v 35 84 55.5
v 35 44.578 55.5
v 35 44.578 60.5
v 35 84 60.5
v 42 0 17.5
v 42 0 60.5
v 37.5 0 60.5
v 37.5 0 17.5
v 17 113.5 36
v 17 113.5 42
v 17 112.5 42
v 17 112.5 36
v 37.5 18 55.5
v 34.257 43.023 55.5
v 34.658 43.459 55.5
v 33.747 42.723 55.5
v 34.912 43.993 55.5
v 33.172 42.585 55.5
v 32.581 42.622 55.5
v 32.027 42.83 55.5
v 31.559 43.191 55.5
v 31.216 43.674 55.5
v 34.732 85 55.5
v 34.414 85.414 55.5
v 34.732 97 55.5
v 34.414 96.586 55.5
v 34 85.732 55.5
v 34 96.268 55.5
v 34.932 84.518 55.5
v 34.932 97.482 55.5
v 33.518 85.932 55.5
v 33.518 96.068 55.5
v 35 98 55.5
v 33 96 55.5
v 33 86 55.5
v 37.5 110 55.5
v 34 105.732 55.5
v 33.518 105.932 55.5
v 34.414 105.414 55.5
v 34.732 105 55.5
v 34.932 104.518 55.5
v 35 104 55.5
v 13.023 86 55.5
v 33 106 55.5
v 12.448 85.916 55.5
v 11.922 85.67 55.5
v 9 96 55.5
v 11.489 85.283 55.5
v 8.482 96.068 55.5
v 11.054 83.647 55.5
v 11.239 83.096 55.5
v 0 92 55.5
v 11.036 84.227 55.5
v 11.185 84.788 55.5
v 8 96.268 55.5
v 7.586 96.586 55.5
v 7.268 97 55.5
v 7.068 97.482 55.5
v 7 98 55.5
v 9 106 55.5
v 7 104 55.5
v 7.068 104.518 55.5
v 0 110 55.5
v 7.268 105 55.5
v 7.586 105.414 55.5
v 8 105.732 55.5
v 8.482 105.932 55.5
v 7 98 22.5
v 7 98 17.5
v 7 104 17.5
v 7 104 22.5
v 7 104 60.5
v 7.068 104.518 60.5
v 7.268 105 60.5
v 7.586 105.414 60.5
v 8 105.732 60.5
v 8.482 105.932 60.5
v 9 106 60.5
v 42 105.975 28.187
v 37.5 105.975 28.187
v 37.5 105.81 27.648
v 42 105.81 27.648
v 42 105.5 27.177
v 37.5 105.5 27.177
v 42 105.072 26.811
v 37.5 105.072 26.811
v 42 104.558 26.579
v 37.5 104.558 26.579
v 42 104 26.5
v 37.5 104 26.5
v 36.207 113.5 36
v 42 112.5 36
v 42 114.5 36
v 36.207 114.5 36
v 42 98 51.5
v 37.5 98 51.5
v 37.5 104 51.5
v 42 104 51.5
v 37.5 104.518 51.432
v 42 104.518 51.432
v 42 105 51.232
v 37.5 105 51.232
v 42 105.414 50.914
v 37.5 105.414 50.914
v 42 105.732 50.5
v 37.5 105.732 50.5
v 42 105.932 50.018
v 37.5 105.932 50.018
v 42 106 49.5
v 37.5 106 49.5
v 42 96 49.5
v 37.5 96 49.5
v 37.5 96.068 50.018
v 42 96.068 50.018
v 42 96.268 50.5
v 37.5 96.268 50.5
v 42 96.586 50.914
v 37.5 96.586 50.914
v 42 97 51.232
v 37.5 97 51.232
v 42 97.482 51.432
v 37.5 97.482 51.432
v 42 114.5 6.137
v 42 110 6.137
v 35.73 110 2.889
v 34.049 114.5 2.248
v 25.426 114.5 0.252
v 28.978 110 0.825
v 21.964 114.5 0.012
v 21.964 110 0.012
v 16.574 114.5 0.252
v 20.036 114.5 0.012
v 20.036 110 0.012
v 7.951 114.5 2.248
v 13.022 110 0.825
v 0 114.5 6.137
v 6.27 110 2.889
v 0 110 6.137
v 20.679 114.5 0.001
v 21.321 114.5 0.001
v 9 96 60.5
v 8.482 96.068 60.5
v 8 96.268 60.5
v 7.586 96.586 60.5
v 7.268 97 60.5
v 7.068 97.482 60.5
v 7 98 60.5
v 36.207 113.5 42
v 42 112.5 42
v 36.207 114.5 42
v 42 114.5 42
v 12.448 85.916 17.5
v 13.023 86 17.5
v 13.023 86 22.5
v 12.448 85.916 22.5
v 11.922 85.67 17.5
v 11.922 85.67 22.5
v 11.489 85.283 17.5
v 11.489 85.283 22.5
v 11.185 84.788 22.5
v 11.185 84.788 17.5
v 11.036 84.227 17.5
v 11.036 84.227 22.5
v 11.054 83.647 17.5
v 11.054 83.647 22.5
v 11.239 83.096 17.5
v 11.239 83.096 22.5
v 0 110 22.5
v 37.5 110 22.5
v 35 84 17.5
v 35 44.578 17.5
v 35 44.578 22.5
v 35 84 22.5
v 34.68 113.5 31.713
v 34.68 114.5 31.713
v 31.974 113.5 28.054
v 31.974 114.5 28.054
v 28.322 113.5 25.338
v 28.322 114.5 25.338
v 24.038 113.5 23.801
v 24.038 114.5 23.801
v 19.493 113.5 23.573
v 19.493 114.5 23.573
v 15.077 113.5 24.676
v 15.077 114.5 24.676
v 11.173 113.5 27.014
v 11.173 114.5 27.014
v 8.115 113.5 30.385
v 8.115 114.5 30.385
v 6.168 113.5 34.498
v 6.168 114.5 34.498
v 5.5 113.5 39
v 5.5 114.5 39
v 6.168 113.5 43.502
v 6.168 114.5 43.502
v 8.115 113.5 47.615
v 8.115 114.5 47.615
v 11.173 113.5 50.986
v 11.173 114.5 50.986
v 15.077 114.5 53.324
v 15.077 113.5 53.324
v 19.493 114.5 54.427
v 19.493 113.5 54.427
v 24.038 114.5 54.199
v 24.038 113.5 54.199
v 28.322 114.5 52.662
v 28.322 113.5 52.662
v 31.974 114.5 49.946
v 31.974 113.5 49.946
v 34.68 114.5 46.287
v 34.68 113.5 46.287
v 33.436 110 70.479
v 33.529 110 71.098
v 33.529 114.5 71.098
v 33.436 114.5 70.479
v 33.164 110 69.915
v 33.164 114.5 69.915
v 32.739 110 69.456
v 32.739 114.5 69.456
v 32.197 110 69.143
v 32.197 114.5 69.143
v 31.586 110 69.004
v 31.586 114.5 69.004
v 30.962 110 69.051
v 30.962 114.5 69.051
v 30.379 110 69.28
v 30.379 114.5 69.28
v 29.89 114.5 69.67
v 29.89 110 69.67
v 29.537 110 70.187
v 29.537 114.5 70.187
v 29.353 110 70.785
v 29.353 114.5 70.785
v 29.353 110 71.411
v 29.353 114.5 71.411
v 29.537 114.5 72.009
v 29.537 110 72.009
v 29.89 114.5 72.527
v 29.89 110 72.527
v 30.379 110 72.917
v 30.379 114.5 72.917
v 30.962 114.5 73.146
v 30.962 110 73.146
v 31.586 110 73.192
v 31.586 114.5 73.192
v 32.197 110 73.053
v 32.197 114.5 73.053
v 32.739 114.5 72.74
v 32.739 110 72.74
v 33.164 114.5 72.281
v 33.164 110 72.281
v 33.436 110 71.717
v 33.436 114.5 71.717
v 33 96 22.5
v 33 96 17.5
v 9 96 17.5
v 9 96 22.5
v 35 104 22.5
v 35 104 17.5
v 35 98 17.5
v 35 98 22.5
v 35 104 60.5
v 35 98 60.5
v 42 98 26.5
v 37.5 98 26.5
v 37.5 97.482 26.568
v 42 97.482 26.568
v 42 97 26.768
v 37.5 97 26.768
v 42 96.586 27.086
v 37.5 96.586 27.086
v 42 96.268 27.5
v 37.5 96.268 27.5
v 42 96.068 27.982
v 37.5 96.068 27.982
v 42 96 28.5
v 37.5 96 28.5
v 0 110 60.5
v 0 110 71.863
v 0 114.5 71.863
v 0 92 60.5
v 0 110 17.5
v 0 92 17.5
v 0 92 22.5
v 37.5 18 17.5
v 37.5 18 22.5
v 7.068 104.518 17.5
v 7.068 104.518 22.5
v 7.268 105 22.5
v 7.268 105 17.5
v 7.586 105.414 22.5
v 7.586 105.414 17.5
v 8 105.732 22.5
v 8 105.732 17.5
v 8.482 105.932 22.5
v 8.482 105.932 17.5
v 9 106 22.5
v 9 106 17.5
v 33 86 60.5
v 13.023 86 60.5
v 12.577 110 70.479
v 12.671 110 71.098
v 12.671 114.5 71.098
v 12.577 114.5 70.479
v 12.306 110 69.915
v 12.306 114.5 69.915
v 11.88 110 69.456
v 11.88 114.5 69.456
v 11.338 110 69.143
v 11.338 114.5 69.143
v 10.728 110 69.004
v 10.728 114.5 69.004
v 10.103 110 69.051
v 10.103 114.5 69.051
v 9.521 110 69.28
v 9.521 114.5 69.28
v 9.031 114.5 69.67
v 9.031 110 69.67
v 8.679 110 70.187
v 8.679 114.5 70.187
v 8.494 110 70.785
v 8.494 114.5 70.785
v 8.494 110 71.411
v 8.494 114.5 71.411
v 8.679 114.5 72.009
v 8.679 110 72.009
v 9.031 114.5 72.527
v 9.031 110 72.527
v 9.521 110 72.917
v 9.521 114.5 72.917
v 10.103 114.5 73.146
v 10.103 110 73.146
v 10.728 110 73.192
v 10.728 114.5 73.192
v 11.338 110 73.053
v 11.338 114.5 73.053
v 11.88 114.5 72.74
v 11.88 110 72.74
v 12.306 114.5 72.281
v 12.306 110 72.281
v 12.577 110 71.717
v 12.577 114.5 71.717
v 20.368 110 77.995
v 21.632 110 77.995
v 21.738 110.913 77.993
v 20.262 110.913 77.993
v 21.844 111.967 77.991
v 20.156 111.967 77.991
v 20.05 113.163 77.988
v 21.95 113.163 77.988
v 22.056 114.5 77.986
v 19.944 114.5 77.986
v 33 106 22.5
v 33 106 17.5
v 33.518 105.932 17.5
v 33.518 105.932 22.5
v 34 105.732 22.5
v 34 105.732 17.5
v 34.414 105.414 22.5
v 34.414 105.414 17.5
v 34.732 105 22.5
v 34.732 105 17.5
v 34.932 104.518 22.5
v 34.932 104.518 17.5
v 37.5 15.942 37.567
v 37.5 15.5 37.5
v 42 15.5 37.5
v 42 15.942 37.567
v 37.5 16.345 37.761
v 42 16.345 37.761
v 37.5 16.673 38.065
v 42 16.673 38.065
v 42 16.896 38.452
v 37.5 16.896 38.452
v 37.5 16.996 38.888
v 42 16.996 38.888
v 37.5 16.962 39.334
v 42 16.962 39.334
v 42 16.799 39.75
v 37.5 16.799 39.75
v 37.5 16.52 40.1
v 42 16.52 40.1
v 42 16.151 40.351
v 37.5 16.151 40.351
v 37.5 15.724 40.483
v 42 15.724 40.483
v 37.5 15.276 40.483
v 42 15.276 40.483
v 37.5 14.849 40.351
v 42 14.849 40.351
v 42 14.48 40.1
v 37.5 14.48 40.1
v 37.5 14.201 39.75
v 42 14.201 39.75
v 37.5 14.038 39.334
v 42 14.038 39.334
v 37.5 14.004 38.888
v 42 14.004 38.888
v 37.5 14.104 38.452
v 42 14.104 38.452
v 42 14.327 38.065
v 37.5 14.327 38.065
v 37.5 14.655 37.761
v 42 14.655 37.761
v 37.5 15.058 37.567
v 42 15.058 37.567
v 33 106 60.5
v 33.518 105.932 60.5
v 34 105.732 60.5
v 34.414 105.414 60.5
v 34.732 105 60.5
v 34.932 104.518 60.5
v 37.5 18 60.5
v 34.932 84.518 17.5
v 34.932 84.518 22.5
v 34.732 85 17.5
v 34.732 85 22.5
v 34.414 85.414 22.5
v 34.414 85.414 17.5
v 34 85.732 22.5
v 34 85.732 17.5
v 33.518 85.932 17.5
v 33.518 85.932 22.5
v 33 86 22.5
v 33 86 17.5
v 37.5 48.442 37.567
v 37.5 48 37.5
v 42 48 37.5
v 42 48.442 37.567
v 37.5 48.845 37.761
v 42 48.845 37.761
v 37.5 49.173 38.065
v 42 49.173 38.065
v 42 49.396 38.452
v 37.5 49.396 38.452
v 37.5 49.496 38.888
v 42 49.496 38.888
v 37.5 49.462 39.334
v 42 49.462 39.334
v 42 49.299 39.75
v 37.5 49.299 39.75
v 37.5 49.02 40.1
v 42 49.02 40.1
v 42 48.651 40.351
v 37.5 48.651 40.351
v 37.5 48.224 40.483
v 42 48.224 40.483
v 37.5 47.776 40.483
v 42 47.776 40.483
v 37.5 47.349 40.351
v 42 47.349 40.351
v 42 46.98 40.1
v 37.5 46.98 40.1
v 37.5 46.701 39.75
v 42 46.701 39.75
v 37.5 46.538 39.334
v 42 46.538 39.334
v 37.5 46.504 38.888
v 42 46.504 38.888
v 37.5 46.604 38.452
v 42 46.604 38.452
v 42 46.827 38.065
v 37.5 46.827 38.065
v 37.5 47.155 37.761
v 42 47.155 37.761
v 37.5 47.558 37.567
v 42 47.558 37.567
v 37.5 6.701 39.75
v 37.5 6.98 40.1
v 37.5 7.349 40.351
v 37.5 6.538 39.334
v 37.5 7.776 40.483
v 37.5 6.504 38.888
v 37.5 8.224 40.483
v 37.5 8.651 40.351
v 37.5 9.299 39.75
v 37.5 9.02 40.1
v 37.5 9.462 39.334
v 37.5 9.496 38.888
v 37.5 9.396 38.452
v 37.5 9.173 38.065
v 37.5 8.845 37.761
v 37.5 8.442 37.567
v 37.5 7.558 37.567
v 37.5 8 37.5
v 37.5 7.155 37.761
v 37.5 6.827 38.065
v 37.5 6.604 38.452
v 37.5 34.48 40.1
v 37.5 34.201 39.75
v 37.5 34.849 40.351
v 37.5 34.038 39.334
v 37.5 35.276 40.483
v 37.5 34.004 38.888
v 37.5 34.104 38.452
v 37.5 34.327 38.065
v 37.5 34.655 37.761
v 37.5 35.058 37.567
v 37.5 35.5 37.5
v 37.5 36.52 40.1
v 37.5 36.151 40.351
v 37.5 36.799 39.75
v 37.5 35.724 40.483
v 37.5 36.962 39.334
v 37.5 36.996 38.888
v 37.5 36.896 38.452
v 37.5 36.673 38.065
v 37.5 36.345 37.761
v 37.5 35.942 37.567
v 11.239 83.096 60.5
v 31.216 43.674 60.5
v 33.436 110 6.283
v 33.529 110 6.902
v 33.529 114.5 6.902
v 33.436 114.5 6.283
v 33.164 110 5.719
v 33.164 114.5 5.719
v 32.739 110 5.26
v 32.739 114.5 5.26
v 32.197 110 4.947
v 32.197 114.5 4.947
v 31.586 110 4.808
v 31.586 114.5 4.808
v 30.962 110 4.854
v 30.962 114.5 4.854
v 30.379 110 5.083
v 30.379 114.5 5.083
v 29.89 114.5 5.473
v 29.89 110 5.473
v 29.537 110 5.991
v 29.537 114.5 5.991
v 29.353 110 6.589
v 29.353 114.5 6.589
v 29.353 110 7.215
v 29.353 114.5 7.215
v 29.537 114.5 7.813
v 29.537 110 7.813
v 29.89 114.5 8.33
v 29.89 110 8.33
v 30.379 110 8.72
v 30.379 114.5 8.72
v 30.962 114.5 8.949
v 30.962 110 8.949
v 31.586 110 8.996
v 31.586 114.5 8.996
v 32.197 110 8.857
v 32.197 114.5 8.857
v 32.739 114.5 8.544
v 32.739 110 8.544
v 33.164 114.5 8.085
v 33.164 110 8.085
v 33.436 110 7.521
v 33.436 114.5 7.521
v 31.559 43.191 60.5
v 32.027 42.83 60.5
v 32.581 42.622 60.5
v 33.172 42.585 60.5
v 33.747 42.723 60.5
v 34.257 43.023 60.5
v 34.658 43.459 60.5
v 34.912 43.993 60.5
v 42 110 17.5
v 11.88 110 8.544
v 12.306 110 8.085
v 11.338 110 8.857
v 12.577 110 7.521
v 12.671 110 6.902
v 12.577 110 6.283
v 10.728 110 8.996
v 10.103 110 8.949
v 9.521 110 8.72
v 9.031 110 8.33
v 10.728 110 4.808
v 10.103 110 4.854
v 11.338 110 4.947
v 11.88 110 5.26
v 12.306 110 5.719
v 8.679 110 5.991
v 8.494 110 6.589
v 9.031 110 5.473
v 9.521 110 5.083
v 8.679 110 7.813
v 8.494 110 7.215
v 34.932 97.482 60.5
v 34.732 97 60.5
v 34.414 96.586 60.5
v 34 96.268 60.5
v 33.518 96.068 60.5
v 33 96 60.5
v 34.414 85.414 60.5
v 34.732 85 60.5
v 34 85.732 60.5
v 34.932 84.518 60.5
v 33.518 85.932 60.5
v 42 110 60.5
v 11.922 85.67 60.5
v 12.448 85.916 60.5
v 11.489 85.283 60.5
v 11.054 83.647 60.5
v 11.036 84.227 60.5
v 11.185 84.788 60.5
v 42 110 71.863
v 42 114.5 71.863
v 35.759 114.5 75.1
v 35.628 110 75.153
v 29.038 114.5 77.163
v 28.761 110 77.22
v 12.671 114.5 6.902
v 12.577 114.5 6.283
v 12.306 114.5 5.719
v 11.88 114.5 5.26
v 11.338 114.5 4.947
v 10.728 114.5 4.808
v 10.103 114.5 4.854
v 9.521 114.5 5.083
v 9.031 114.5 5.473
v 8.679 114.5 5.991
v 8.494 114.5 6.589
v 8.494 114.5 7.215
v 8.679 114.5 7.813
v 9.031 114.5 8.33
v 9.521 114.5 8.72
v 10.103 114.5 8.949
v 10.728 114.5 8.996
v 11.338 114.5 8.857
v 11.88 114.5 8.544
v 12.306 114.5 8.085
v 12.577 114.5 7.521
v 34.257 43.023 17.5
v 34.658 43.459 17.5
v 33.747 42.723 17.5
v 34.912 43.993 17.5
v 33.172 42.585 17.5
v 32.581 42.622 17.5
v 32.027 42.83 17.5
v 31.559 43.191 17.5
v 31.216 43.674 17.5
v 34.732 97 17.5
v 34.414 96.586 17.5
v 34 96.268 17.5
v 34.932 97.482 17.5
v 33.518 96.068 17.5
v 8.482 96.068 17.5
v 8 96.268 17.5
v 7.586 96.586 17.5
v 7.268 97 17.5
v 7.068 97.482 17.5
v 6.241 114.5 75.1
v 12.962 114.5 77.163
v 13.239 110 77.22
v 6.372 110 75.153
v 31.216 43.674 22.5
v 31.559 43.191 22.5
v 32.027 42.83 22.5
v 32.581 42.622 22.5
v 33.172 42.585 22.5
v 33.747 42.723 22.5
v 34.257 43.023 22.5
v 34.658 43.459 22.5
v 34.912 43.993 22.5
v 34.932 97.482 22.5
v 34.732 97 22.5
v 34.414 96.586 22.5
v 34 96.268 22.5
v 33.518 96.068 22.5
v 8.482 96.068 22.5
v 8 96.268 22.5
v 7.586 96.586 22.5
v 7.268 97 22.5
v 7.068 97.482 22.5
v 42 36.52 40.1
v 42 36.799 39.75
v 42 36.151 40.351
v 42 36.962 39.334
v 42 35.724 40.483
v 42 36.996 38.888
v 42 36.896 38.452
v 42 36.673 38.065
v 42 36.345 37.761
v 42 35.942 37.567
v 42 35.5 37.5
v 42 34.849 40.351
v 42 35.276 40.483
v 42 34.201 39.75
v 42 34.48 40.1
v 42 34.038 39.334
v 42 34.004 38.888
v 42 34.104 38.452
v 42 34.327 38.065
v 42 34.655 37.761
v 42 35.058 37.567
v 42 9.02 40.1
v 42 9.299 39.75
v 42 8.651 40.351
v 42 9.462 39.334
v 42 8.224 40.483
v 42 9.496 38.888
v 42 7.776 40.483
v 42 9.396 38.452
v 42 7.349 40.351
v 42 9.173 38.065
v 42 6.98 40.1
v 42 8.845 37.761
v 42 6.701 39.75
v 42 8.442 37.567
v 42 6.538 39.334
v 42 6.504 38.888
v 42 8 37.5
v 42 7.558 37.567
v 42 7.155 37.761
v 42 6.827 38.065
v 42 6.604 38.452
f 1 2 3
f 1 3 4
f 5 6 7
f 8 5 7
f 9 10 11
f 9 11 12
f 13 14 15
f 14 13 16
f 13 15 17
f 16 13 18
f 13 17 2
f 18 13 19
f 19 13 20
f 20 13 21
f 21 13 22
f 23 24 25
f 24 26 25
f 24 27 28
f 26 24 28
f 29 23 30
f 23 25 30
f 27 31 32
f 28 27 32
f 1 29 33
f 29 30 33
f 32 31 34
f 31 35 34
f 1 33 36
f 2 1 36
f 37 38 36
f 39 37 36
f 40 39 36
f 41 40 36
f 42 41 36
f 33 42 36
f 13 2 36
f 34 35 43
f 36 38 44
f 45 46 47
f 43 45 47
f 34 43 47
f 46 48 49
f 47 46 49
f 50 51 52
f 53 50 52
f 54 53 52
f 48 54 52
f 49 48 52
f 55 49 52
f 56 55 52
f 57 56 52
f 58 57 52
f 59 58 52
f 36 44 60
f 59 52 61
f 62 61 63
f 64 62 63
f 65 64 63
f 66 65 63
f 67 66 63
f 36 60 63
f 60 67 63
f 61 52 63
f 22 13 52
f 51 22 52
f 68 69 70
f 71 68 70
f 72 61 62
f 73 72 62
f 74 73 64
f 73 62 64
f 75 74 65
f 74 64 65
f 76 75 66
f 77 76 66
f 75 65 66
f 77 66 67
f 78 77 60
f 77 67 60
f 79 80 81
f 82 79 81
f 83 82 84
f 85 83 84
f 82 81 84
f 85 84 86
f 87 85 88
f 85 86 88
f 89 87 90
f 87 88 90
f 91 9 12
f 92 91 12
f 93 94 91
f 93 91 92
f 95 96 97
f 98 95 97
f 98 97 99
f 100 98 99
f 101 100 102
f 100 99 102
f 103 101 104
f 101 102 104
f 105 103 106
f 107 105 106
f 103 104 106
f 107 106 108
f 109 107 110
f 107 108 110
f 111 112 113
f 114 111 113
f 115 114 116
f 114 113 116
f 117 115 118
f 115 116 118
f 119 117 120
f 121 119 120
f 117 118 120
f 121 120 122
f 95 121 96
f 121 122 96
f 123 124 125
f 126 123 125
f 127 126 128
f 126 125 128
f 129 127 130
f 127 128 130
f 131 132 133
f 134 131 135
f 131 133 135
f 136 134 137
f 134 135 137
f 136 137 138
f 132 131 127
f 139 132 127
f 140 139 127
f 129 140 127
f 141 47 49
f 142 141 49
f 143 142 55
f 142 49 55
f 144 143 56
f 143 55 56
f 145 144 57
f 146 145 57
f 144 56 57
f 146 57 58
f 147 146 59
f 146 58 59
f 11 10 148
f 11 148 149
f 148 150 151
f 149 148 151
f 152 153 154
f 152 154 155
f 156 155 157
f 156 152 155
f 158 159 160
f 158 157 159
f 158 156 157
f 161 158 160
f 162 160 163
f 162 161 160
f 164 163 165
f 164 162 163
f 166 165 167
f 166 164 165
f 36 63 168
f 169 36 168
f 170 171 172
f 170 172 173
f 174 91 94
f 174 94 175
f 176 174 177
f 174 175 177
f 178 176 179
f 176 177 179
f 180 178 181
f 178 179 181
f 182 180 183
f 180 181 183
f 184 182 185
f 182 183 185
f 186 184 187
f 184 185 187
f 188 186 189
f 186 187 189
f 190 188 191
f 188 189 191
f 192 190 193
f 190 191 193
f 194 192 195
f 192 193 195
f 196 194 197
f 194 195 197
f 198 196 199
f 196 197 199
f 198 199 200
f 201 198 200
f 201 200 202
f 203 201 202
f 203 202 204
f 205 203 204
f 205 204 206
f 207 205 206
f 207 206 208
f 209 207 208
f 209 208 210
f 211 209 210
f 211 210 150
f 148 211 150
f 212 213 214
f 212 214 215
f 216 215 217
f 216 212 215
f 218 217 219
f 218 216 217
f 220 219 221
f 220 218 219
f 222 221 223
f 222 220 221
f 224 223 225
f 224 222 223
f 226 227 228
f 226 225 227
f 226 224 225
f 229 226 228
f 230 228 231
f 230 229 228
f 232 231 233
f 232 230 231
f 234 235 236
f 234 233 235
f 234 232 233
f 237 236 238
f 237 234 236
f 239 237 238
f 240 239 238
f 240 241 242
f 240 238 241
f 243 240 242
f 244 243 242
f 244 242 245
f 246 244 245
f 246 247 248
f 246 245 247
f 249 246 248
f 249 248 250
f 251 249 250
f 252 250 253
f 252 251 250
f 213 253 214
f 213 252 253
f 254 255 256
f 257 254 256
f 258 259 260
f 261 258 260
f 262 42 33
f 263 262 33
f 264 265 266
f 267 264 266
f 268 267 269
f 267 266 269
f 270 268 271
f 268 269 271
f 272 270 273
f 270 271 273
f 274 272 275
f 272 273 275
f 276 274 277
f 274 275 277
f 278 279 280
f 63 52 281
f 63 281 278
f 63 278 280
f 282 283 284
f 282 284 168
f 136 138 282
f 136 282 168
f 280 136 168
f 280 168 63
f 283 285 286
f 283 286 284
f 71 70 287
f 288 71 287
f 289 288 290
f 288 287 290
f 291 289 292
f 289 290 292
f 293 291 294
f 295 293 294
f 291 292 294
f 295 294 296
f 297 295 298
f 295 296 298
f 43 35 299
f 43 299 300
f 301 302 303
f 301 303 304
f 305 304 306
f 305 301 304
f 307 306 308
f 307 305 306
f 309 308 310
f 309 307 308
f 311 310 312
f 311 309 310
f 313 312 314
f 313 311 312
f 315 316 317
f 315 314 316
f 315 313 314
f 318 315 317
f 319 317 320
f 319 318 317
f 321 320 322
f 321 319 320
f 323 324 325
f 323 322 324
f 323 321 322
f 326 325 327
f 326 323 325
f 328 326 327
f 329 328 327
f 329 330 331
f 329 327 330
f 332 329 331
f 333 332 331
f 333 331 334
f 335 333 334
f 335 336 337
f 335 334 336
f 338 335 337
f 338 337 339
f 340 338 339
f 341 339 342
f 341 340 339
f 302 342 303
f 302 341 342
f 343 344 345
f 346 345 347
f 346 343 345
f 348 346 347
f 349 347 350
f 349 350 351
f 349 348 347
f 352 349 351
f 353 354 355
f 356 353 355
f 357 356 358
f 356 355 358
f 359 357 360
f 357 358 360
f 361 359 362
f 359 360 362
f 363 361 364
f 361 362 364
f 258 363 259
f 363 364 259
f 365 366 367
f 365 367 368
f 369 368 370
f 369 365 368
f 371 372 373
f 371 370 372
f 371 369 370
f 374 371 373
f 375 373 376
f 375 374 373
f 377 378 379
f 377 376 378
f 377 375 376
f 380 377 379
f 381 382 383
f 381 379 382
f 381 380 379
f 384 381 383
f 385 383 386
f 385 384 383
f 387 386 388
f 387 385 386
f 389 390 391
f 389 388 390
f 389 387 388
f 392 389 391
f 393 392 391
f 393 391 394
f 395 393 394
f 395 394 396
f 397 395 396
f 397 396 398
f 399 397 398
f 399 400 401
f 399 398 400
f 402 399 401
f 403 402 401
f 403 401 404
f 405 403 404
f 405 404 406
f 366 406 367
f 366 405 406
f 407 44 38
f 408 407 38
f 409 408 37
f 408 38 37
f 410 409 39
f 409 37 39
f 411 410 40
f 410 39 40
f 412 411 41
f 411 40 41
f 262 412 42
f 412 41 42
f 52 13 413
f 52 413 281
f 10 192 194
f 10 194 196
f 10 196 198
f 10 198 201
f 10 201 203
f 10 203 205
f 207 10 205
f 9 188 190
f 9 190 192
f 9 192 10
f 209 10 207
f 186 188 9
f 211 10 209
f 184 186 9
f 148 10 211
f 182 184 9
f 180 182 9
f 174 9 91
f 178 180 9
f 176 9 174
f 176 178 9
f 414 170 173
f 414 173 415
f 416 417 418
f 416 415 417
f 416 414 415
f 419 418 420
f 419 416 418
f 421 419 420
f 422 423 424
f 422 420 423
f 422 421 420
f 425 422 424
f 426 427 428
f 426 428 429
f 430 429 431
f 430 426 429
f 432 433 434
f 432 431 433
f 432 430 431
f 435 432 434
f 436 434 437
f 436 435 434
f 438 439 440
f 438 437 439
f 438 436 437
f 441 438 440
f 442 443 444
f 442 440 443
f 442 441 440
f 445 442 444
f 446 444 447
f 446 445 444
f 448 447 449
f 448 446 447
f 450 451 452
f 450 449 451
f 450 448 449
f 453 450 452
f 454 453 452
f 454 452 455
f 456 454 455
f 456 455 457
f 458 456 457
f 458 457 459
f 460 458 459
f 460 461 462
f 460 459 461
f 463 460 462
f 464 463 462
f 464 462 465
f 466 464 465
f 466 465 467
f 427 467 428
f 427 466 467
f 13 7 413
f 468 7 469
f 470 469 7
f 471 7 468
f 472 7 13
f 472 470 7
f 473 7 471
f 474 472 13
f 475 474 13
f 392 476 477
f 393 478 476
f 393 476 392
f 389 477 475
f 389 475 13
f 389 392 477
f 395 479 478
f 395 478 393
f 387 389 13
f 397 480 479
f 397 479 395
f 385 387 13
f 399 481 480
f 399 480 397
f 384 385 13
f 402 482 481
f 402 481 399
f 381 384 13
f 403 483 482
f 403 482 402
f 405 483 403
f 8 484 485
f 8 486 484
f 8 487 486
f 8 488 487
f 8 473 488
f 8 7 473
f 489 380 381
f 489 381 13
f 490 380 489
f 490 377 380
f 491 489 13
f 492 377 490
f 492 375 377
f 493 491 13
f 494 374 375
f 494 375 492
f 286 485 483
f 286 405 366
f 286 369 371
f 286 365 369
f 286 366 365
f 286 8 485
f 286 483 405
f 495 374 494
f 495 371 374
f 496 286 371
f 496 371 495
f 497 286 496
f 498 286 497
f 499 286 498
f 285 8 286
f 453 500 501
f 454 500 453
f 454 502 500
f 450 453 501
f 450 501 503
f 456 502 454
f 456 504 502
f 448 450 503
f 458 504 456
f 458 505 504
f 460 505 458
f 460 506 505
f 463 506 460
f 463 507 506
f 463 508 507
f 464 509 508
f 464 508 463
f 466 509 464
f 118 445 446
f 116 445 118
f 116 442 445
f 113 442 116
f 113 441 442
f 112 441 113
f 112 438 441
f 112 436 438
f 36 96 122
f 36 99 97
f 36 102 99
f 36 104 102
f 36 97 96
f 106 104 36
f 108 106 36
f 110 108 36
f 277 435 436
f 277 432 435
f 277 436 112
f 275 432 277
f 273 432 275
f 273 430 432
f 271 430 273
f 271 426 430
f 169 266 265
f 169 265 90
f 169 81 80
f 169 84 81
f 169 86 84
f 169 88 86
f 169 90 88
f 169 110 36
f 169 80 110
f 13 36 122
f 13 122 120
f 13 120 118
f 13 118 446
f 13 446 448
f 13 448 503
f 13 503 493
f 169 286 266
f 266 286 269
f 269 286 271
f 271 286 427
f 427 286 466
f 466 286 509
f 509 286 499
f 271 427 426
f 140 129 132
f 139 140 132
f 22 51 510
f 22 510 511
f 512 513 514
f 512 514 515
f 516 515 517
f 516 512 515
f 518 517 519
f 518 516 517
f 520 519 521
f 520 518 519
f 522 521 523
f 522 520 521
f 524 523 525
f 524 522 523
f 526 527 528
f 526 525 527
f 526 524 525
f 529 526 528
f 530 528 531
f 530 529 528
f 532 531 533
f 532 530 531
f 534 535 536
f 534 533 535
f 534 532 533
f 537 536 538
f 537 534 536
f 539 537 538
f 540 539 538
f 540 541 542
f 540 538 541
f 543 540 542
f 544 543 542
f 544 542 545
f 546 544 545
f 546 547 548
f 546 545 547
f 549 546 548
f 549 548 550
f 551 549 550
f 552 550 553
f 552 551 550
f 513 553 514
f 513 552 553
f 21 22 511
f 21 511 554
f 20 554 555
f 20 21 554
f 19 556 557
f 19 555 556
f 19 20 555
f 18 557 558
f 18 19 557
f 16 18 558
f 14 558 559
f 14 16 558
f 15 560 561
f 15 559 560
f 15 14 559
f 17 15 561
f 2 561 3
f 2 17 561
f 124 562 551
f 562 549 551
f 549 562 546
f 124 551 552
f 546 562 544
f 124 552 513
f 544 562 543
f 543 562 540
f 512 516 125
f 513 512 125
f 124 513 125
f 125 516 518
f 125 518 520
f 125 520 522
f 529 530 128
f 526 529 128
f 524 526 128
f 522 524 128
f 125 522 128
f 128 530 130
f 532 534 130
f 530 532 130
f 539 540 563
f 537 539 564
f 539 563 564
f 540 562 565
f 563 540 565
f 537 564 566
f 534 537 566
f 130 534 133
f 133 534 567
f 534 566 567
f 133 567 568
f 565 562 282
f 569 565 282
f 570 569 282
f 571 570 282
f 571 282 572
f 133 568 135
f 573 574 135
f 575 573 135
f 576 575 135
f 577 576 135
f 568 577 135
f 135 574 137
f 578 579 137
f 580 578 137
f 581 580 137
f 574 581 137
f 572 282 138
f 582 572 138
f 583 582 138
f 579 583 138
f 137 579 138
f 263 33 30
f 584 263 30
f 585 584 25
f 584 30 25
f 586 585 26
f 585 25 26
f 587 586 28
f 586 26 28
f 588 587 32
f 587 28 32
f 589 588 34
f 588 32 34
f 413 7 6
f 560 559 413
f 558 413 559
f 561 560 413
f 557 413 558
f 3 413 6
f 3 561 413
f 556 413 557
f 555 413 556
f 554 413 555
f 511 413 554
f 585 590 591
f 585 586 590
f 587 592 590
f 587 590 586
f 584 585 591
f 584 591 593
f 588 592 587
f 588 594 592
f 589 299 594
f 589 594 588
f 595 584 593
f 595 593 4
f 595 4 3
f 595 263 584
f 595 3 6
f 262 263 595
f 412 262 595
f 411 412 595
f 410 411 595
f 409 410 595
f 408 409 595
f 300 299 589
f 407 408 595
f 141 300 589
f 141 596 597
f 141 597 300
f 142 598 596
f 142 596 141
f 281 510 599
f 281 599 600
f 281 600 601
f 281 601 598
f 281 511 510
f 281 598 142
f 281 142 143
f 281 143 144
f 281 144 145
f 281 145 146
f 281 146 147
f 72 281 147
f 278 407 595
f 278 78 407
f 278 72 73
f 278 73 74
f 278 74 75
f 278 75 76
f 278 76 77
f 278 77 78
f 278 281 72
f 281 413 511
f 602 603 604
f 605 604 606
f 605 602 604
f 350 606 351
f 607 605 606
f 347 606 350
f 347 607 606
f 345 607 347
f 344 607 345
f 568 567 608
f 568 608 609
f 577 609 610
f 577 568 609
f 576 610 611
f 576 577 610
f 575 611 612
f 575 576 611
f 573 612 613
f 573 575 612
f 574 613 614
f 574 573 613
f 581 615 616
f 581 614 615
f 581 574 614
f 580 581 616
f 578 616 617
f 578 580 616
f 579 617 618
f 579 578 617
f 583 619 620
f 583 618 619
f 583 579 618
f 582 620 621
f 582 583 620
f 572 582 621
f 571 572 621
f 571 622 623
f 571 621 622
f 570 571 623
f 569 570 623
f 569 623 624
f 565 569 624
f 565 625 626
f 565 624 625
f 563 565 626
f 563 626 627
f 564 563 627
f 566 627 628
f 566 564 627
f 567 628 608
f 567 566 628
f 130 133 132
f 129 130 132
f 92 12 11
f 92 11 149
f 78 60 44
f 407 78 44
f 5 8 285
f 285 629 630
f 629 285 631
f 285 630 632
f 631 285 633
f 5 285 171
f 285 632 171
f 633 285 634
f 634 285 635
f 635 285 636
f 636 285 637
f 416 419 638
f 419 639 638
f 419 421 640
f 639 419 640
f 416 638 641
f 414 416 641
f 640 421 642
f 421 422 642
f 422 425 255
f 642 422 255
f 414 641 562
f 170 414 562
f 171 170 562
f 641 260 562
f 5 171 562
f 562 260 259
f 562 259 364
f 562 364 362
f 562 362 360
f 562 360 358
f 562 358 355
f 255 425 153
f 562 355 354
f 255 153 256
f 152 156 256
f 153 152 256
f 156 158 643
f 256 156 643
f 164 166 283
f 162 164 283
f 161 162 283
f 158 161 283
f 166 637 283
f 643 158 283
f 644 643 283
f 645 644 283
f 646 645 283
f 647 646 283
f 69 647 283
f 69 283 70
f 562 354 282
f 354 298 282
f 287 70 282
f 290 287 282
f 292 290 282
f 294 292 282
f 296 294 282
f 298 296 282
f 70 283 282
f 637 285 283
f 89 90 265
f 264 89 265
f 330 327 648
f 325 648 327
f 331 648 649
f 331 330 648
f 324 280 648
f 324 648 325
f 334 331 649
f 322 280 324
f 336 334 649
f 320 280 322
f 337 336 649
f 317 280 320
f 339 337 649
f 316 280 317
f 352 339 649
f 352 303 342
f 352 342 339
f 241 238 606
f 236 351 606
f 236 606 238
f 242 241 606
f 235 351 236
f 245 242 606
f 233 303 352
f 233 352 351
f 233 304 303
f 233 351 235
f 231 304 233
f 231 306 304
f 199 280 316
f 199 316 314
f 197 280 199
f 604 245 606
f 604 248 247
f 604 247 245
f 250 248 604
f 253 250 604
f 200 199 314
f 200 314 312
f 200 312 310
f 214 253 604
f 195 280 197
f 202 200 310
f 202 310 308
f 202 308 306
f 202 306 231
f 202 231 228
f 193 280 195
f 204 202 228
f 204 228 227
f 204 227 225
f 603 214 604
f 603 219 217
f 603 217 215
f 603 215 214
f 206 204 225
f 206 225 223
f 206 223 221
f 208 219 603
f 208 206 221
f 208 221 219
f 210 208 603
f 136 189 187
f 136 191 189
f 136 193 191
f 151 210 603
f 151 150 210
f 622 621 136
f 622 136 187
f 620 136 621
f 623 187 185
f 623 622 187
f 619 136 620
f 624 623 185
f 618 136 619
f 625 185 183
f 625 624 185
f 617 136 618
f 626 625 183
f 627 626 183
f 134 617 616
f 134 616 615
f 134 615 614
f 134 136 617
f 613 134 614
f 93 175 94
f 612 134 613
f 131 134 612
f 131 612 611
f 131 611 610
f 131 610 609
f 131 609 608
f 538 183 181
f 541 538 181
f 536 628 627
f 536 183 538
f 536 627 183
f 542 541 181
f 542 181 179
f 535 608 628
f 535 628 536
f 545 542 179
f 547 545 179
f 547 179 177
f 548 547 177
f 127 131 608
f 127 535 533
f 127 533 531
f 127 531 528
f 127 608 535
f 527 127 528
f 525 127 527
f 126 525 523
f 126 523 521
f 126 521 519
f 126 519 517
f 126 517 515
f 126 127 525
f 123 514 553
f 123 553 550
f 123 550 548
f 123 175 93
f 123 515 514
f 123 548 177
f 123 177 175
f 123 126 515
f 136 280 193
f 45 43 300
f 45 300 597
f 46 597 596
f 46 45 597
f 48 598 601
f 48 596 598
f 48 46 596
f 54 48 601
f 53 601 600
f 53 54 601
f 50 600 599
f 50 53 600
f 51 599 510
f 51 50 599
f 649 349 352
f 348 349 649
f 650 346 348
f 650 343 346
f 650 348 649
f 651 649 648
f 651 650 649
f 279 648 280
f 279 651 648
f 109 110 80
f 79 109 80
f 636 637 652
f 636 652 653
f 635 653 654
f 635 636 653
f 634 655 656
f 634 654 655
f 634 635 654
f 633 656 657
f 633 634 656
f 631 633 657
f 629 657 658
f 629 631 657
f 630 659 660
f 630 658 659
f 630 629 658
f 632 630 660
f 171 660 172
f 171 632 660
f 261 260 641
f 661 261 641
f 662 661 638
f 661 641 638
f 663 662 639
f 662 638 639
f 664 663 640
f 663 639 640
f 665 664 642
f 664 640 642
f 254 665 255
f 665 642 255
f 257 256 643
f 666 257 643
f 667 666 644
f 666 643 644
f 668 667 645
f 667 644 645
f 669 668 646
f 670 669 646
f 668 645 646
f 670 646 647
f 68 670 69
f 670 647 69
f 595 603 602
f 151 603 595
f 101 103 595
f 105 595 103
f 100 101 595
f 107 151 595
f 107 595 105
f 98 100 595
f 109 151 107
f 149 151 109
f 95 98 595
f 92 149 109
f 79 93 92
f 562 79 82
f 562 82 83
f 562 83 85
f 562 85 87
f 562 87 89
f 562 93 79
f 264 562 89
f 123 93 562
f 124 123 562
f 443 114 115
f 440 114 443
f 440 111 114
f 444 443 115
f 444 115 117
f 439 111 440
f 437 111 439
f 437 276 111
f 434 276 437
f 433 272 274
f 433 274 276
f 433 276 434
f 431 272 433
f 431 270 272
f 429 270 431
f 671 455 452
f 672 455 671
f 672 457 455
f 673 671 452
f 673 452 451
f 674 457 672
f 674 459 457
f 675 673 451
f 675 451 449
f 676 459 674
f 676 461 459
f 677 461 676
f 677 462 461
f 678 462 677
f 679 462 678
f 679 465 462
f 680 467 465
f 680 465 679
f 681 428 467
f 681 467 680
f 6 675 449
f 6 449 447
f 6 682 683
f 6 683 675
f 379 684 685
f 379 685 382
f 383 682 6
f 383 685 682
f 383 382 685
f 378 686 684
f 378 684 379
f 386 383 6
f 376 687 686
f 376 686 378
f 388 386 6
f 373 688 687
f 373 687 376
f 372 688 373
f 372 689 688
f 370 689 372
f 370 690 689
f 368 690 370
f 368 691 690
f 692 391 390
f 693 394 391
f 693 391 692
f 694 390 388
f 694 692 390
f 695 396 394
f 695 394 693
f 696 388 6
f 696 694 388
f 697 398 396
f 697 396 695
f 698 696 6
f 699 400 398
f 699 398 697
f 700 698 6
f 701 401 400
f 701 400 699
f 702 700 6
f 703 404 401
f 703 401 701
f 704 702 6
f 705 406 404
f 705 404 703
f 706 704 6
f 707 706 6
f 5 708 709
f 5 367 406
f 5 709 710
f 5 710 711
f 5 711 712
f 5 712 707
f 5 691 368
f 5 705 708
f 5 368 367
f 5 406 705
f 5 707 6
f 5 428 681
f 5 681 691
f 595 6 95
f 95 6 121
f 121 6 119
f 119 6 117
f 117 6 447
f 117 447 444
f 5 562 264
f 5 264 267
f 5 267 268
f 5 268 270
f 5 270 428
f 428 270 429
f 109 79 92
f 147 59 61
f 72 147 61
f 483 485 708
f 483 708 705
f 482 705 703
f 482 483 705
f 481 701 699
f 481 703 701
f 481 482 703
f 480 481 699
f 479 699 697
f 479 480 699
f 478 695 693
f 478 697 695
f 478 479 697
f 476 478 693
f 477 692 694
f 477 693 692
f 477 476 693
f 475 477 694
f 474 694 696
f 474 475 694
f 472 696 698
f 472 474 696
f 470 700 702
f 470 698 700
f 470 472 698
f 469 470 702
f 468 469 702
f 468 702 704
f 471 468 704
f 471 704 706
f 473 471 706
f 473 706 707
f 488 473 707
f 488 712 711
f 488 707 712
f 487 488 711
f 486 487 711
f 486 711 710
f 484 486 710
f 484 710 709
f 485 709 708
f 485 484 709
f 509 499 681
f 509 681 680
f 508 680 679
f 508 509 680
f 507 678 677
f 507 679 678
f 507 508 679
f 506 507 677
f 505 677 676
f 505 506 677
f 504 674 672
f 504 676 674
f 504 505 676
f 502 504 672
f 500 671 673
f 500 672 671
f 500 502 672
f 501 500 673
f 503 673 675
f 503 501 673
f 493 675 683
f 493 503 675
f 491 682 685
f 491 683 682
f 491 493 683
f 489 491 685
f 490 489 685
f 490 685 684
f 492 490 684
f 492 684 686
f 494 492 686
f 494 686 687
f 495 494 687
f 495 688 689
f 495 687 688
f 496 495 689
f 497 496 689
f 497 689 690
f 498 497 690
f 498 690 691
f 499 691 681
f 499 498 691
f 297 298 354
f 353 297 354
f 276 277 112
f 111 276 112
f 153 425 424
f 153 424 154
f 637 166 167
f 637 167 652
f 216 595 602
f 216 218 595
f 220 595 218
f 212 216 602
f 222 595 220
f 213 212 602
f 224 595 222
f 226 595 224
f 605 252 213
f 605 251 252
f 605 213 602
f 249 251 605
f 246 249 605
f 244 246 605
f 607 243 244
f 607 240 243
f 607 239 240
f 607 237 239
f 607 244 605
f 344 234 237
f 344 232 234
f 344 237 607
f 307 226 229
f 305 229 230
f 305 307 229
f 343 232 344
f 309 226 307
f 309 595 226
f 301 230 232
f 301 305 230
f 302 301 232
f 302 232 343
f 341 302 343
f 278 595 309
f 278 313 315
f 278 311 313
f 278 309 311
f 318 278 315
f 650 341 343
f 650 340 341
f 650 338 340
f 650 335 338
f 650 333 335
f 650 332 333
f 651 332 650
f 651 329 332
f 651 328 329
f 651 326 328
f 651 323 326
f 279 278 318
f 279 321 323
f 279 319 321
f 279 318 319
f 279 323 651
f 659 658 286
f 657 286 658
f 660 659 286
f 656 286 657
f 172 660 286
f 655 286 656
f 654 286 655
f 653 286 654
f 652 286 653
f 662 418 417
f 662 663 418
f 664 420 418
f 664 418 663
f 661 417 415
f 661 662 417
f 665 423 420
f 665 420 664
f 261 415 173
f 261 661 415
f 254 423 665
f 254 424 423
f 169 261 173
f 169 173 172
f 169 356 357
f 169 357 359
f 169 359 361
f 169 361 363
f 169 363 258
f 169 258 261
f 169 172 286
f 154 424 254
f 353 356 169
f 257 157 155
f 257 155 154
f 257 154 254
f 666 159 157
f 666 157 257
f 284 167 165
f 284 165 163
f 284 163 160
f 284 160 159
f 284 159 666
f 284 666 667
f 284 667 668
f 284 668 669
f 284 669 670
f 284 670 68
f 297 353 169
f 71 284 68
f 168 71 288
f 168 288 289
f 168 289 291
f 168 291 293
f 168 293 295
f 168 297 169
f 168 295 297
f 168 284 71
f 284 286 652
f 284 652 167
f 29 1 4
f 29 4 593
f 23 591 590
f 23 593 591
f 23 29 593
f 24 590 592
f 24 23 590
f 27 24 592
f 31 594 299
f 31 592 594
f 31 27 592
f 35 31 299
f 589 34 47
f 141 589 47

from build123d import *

# Parameters (mm, degrees)
BOSS_EXTRUDE1_DEPTH     = 80
SKETCH2_W               = 33
SKETCH2_H               = 110
CUT_EXTRUDE2_DEPTH      = 37.5
CUT_EXTRUDE6_DEPTH      = 55.5
SKETCH7_R               = 1.5000015
SKETCH7_R_2             = 1.499999754
SKETCH7_R_3             = 1.499999424
SKETCH7_R_4             = 1.499998917
CUT_EXTRUDE8_DEPTH      = 43
CUT_EXTRUDE8_DEPTH_BACK = 55.5
CUT_EXTRUDE9_DEPTH      = 110.5
CUT_EXTRUDE10_DEPTH     = 196.5
SKETCH11_R              = 2.10000039
SKETCH11_R_2            = 2.100000448
SKETCH11_R_3            = 2.1000011
SKETCH11_R_4            = 2.099999964
CUT_EXTRUDE11_DEPTH     = 196.5
CUT_EXTRUDE12_START     = 114.5
SKETCH12_R              = 15.500000658
CUT_EXTRUDE12_DEPTH     = 1
CUT_EXTRUDE13_START     = 114.5
SKETCH13_W              = 25
SKETCH13_H              = 6
CUT_EXTRUDE13_DEPTH     = 2


with BuildPart() as part:
    # Sketch1 → Boss-Extrude1 (new body)
    with BuildSketch(Plane.XY):
        Polygon((0, 114.5), (42, 114.5), (42, 0), (37.5, 0), (37.5, 18), (0, 92), align=None)
    extrude(amount=BOSS_EXTRUDE1_DEPTH)

    # Sketch2 → Cut-Extrude2 (cut)
    with BuildSketch(Plane(origin=(0, 0, 0), x_dir=(0, 0, -1), z_dir=(1, 0, 0))):
        with Locations((-39, 55)):
            Rectangle(SKETCH2_W, SKETCH2_H)
    extrude(amount=CUT_EXTRUDE2_DEPTH, mode=Mode.SUBTRACT)

    # Sketch6 → Cut-Extrude6 (cut)
    with BuildSketch(Plane(origin=(0, 0, 0), x_dir=(0, 0, -1), z_dir=(1, 0, 0))):
        Polygon((-17.5, 110), (-0.011922265, 110), (-0.011922265, 114.499832966), (14.004945748, 114.499832966), (14.004945748, 0), (-17.5, 0), align=None)
        Polygon((-60.5, 110), (-77.994888003, 110), (-77.985702515, 114.5), (-108.593167203, 114.5), (-108.593167203, 0), (-60.5, 0), align=None)
    extrude(amount=CUT_EXTRUDE6_DEPTH, mode=Mode.SUBTRACT)

    # Sketch7 → Cut-Extrude8 (cut, two sides)
    with BuildSketch(Plane(origin=(0, 0, 0), x_dir=(0, 0, -1), z_dir=(1, 0, 0))) as cut_extrude8_sk:
        with Locations((-39.000000948, 47.999997685)):
            Circle(SKETCH7_R)
        with Locations((-39, 35.499996297)):
            Circle(SKETCH7_R_2)
        with Locations((-39.000001283, 8.000001659)):
            Circle(SKETCH7_R_3)
        with Locations((-39.000000539, 15.500000933)):
            Circle(SKETCH7_R_4)
        with BuildLine():
            Line((-49.5, 106), (-28.187131882, 105.975372314))
            ThreePointArc((-28.187131882, 105.975372314), (-26.979186724, 105.298896246), (-26.5, 104))
            Line((-26.5, 104), (-26.5, 98))
            ThreePointArc((-26.5, 98), (-27.085785866, 96.585785866), (-28.5, 96))
            Line((-28.5, 96), (-49.5, 96))
            ThreePointArc((-49.5, 96), (-50.914215088, 96.585784912), (-51.5, 98))
            Line((-51.5, 98), (-51.5, 104))
            ThreePointArc((-51.5, 104), (-50.914215088, 105.414215088), (-49.5, 106))
        make_face()
    extrude(amount=CUT_EXTRUDE8_DEPTH, mode=Mode.SUBTRACT)
    extrude(cut_extrude8_sk.sketch, amount=-CUT_EXTRUDE8_DEPTH_BACK, mode=Mode.SUBTRACT)

    # Sketch8 → Cut-Extrude9 (cut)
    with BuildSketch(Plane.XY):
        with BuildLine():
            Line((33, 86), (13.022629738, 86))
            ThreePointArc((13.022629738, 86), (11.318500031, 85.046870918), (11.238623619, 83.095939636))
            Line((11.238623619, 83.095939636), (31.215991974, 43.673931122))
            ThreePointArc((31.215991974, 43.673931122), (33.464748466, 42.632740588), (35, 44.577987671))
            Line((35, 44.577987671), (35, 84))
            ThreePointArc((35, 84), (34.414214051, 85.414214051), (33, 86))
        make_face()
        with BuildLine():
            Line((9, 106), (33, 106))
            ThreePointArc((33, 106), (34.414214051, 105.414214051), (35, 104))
            Line((35, 104), (35, 98))
            ThreePointArc((35, 98), (34.414214051, 96.585785949), (33, 96))
            Line((33, 96), (9, 96))
            ThreePointArc((9, 96), (7.585785856, 96.585786135), (6.999999046, 98))
            Line((6.999999046, 98), (6.999999046, 104))
            ThreePointArc((6.999999046, 104), (7.585785772, 105.414213949), (9, 106))
        make_face()
    extrude(amount=CUT_EXTRUDE9_DEPTH, mode=Mode.SUBTRACT)

    # Sketch10 → Cut-Extrude10 (cut)
    with BuildSketch(Plane(origin=(0, 0, 0), x_dir=(1, 0, 0), z_dir=(0, 1, 0))):
        with BuildLine():
            Line((0, -6.136648178), (0, 15.4695464))
            Line((0, 15.4695464), (11.339564335, 15.4695464))
            Line((11.339564335, 15.4695464), (42, 15.4695464))
            Line((42, 15.4695464), (42, -6.136648178))
            ThreePointArc((42, -6.136648178), (21, -2.155e-06), (0, -6.136648178))
        make_face()
        with BuildLine():
            Line((0, -71.863349915), (0, -99.275377961))
            Line((0, -99.275377961), (42, -99.275377961))
            Line((42, -99.275377961), (42, -71.863349915))
            ThreePointArc((42, -71.863349915), (21, -78.000003087), (0, -71.863349915))
        make_face()
    extrude(amount=CUT_EXTRUDE10_DEPTH, mode=Mode.SUBTRACT)

    # Sketch11 → Cut-Extrude11 (cut)
    with BuildSketch(Plane(origin=(0, 0, 0), x_dir=(1, 0, 0), z_dir=(0, 1, 0))):
        with Locations((10.570675656, -6.901843556)):
            Circle(SKETCH11_R)
        with Locations((31.429323256, -6.901843615)):
            Circle(SKETCH11_R_2)
        with Locations((31.429323915, -71.098157164)):
            Circle(SKETCH11_R_3)
        with Locations((10.570676027, -71.098155911)):
            Circle(SKETCH11_R_4)
    extrude(amount=CUT_EXTRUDE11_DEPTH, mode=Mode.SUBTRACT)

    # Sketch12 → Cut-Extrude12 (cut)
    with BuildSketch(Plane(origin=(0, 0, 0), x_dir=(1, 0, 0), z_dir=(0, 1, 0)).offset(CUT_EXTRUDE12_START)):
        with Locations((20.999998985, -39.000002134)):
            Circle(SKETCH12_R)
    extrude(amount=-CUT_EXTRUDE12_DEPTH, mode=Mode.SUBTRACT)

    # Sketch13 → Cut-Extrude13 (cut)
    with BuildSketch(Plane(origin=(0, 0, 0), x_dir=(1, 0, 0), z_dir=(0, 1, 0)).offset(CUT_EXTRUDE13_START)):
        with Locations((29.5, -39)):
            Rectangle(SKETCH13_W, SKETCH13_H)
    extrude(amount=-CUT_EXTRUDE13_DEPTH, mode=Mode.SUBTRACT)


solid = part.part
